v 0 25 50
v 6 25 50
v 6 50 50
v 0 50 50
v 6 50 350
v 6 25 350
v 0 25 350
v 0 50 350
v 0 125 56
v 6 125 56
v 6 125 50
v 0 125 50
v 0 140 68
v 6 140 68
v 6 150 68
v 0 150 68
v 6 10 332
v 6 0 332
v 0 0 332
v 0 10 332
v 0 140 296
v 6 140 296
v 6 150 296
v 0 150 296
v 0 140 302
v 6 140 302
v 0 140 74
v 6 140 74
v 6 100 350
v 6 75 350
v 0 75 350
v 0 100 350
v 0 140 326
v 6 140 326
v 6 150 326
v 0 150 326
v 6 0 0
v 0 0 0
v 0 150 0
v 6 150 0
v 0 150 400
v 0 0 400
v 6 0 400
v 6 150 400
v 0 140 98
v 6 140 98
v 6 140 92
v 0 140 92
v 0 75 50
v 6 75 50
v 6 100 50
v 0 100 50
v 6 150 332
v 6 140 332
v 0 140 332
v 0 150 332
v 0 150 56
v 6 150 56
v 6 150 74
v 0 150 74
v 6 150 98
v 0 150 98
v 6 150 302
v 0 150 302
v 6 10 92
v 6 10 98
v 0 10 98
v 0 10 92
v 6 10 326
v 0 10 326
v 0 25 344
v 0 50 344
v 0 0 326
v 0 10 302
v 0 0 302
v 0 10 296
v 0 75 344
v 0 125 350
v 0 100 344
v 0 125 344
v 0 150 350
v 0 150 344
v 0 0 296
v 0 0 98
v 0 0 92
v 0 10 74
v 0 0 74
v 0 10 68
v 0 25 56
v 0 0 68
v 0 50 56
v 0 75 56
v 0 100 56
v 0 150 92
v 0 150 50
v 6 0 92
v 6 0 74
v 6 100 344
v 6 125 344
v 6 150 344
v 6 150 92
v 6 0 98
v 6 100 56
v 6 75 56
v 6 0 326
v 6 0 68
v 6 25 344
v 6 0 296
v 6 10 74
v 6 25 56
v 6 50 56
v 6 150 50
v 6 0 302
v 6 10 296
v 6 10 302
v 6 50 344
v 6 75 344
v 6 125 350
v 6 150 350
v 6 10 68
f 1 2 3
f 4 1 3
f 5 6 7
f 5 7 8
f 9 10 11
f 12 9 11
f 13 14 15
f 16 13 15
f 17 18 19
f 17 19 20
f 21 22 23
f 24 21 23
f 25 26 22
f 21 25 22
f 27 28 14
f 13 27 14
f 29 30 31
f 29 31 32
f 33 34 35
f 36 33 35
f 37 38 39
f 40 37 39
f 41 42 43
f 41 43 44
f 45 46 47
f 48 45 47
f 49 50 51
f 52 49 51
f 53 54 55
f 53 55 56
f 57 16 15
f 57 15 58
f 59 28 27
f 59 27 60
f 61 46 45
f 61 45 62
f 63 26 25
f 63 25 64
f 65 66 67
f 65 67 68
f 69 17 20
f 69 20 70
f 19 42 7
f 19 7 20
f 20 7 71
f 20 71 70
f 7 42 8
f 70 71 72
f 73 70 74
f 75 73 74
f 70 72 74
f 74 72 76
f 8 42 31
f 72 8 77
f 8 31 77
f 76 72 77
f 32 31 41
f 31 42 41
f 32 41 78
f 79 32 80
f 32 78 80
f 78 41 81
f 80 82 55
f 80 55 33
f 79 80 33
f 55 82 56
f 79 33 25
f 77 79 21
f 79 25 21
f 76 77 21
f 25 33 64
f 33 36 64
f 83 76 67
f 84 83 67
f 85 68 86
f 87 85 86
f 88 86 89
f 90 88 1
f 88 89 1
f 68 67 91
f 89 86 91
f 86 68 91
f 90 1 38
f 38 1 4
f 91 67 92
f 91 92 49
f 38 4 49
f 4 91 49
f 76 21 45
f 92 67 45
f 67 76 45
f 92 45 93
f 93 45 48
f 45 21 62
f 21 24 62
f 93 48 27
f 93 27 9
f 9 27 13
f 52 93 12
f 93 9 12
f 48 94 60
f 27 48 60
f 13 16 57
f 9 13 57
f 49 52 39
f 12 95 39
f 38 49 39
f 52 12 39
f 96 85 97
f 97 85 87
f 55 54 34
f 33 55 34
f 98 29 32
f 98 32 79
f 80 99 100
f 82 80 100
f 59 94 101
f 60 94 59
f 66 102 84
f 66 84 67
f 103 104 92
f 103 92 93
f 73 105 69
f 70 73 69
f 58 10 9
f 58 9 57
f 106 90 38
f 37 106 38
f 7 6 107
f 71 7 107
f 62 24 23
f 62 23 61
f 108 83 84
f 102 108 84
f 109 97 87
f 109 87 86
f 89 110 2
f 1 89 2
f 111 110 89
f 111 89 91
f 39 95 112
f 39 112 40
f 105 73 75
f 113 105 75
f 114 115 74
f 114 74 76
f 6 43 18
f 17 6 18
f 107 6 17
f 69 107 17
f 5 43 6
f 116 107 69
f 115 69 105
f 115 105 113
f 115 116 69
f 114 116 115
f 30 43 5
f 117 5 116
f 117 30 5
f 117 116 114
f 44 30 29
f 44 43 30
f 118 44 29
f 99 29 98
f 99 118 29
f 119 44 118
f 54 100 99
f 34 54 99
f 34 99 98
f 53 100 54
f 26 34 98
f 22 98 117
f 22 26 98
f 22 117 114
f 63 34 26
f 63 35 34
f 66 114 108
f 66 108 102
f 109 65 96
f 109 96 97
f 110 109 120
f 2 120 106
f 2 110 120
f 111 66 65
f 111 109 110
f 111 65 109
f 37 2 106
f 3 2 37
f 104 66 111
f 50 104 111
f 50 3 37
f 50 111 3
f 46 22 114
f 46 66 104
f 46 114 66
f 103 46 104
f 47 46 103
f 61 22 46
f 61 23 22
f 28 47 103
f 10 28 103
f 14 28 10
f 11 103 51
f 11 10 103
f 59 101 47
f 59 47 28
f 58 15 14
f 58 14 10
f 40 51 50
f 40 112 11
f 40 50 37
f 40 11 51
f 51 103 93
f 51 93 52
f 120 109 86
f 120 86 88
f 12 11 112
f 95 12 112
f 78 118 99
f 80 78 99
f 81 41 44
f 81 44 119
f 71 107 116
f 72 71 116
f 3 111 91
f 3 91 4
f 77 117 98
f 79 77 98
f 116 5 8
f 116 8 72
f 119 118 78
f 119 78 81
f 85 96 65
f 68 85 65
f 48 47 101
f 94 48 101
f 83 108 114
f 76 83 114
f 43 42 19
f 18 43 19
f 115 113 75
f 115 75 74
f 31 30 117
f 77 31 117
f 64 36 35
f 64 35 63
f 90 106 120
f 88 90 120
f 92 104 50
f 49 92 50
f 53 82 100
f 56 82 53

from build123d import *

# Parameters (mm, degrees)
SKETCH1_W            = 400
SKETCH1_H            = 150
BOSS_EXTRUDE1_DEPTH  = 6
SKETCH3_W            = 6
SKETCH3_H            = 25
CUT_EXTRUDE1_DEPTH   = 428.242320001
LPATTERN1_COUNT      = 2
LPATTERN1_PITCH      = 294
LPATTERN1_COUNT_DIR2 = 3
LPATTERN1_PITCH_DIR2 = 50
SKETCH4_W            = 6
SKETCH4_H            = 10
CUT_EXTRUDE2_DEPTH   = 428.242320001
LPATTERN2_COUNT      = 2
LPATTERN2_PITCH      = 258
LPATTERN2_COUNT_DIR2 = 2
LPATTERN2_PITCH_DIR2 = 140
SKETCH5_W            = 6
SKETCH5_H            = 10
CUT_EXTRUDE3_DEPTH   = 428.242320001
LPATTERN3_COUNT      = 2
LPATTERN3_PITCH      = 140
LPATTERN3_COUNT_DIR2 = 2
LPATTERN3_PITCH_DIR2 = 204


with BuildPart() as part:
    # Sketch1 → Boss-Extrude1 (new body)
    with BuildSketch(Plane(origin=(0, 0, 0), x_dir=(0, 0, -1), z_dir=(1, 0, 0))):
        with Locations((-200, 75)):
            Rectangle(SKETCH1_W, SKETCH1_H)
    extrude(amount=BOSS_EXTRUDE1_DEPTH)

    # Sketch3 → Cut-Extrude1 (cut, through all)
    with BuildSketch(Plane(origin=(6, 0, 0), x_dir=(0, 0, -1), z_dir=(1, 0, 0))):
        with Locations((-347, 137.5)):
            Rectangle(SKETCH3_W, SKETCH3_H)
    cut_extrude1 = extrude(amount=-CUT_EXTRUDE1_DEPTH, mode=Mode.SUBTRACT)

    # LPattern1: Cut-Extrude1 2 × 3
    with Locations(*[(0, -j * LPATTERN1_PITCH_DIR2, -i * LPATTERN1_PITCH) for i in range(LPATTERN1_COUNT) for j in range(LPATTERN1_COUNT_DIR2) if (i, j) != (0, 0)]):
        add(cut_extrude1, mode=Mode.SUBTRACT)

    # Sketch4 → Cut-Extrude2 (cut, through all)
    with BuildSketch(Plane(origin=(6, 0, 0), x_dir=(0, 0, -1), z_dir=(1, 0, 0))):
        with Locations((-329, 145)):
            Rectangle(SKETCH4_W, SKETCH4_H)
    cut_extrude2 = extrude(amount=-CUT_EXTRUDE2_DEPTH, mode=Mode.SUBTRACT)

    # LPattern2: Cut-Extrude2 2 × 2
    with Locations(*[(0, -j * LPATTERN2_PITCH_DIR2, -i * LPATTERN2_PITCH) for i in range(LPATTERN2_COUNT) for j in range(LPATTERN2_COUNT_DIR2) if (i, j) != (0, 0)]):
        add(cut_extrude2, mode=Mode.SUBTRACT)

    # Sketch5 → Cut-Extrude3 (cut, through all)
    with BuildSketch(Plane(origin=(6, 0, 0), x_dir=(0, 0, -1), z_dir=(1, 0, 0))):
        with Locations((-299, 145)):
            Rectangle(SKETCH5_W, SKETCH5_H)
    cut_extrude3 = extrude(amount=-CUT_EXTRUDE3_DEPTH, mode=Mode.SUBTRACT)

    # LPattern3: Cut-Extrude3 2 × 2
    with Locations(*[(0, -i * LPATTERN3_PITCH, -j * LPATTERN3_PITCH_DIR2) for i in range(LPATTERN3_COUNT) for j in range(LPATTERN3_COUNT_DIR2) if (i, j) != (0, 0)]):
        add(cut_extrude3, mode=Mode.SUBTRACT)


solid = part.part
